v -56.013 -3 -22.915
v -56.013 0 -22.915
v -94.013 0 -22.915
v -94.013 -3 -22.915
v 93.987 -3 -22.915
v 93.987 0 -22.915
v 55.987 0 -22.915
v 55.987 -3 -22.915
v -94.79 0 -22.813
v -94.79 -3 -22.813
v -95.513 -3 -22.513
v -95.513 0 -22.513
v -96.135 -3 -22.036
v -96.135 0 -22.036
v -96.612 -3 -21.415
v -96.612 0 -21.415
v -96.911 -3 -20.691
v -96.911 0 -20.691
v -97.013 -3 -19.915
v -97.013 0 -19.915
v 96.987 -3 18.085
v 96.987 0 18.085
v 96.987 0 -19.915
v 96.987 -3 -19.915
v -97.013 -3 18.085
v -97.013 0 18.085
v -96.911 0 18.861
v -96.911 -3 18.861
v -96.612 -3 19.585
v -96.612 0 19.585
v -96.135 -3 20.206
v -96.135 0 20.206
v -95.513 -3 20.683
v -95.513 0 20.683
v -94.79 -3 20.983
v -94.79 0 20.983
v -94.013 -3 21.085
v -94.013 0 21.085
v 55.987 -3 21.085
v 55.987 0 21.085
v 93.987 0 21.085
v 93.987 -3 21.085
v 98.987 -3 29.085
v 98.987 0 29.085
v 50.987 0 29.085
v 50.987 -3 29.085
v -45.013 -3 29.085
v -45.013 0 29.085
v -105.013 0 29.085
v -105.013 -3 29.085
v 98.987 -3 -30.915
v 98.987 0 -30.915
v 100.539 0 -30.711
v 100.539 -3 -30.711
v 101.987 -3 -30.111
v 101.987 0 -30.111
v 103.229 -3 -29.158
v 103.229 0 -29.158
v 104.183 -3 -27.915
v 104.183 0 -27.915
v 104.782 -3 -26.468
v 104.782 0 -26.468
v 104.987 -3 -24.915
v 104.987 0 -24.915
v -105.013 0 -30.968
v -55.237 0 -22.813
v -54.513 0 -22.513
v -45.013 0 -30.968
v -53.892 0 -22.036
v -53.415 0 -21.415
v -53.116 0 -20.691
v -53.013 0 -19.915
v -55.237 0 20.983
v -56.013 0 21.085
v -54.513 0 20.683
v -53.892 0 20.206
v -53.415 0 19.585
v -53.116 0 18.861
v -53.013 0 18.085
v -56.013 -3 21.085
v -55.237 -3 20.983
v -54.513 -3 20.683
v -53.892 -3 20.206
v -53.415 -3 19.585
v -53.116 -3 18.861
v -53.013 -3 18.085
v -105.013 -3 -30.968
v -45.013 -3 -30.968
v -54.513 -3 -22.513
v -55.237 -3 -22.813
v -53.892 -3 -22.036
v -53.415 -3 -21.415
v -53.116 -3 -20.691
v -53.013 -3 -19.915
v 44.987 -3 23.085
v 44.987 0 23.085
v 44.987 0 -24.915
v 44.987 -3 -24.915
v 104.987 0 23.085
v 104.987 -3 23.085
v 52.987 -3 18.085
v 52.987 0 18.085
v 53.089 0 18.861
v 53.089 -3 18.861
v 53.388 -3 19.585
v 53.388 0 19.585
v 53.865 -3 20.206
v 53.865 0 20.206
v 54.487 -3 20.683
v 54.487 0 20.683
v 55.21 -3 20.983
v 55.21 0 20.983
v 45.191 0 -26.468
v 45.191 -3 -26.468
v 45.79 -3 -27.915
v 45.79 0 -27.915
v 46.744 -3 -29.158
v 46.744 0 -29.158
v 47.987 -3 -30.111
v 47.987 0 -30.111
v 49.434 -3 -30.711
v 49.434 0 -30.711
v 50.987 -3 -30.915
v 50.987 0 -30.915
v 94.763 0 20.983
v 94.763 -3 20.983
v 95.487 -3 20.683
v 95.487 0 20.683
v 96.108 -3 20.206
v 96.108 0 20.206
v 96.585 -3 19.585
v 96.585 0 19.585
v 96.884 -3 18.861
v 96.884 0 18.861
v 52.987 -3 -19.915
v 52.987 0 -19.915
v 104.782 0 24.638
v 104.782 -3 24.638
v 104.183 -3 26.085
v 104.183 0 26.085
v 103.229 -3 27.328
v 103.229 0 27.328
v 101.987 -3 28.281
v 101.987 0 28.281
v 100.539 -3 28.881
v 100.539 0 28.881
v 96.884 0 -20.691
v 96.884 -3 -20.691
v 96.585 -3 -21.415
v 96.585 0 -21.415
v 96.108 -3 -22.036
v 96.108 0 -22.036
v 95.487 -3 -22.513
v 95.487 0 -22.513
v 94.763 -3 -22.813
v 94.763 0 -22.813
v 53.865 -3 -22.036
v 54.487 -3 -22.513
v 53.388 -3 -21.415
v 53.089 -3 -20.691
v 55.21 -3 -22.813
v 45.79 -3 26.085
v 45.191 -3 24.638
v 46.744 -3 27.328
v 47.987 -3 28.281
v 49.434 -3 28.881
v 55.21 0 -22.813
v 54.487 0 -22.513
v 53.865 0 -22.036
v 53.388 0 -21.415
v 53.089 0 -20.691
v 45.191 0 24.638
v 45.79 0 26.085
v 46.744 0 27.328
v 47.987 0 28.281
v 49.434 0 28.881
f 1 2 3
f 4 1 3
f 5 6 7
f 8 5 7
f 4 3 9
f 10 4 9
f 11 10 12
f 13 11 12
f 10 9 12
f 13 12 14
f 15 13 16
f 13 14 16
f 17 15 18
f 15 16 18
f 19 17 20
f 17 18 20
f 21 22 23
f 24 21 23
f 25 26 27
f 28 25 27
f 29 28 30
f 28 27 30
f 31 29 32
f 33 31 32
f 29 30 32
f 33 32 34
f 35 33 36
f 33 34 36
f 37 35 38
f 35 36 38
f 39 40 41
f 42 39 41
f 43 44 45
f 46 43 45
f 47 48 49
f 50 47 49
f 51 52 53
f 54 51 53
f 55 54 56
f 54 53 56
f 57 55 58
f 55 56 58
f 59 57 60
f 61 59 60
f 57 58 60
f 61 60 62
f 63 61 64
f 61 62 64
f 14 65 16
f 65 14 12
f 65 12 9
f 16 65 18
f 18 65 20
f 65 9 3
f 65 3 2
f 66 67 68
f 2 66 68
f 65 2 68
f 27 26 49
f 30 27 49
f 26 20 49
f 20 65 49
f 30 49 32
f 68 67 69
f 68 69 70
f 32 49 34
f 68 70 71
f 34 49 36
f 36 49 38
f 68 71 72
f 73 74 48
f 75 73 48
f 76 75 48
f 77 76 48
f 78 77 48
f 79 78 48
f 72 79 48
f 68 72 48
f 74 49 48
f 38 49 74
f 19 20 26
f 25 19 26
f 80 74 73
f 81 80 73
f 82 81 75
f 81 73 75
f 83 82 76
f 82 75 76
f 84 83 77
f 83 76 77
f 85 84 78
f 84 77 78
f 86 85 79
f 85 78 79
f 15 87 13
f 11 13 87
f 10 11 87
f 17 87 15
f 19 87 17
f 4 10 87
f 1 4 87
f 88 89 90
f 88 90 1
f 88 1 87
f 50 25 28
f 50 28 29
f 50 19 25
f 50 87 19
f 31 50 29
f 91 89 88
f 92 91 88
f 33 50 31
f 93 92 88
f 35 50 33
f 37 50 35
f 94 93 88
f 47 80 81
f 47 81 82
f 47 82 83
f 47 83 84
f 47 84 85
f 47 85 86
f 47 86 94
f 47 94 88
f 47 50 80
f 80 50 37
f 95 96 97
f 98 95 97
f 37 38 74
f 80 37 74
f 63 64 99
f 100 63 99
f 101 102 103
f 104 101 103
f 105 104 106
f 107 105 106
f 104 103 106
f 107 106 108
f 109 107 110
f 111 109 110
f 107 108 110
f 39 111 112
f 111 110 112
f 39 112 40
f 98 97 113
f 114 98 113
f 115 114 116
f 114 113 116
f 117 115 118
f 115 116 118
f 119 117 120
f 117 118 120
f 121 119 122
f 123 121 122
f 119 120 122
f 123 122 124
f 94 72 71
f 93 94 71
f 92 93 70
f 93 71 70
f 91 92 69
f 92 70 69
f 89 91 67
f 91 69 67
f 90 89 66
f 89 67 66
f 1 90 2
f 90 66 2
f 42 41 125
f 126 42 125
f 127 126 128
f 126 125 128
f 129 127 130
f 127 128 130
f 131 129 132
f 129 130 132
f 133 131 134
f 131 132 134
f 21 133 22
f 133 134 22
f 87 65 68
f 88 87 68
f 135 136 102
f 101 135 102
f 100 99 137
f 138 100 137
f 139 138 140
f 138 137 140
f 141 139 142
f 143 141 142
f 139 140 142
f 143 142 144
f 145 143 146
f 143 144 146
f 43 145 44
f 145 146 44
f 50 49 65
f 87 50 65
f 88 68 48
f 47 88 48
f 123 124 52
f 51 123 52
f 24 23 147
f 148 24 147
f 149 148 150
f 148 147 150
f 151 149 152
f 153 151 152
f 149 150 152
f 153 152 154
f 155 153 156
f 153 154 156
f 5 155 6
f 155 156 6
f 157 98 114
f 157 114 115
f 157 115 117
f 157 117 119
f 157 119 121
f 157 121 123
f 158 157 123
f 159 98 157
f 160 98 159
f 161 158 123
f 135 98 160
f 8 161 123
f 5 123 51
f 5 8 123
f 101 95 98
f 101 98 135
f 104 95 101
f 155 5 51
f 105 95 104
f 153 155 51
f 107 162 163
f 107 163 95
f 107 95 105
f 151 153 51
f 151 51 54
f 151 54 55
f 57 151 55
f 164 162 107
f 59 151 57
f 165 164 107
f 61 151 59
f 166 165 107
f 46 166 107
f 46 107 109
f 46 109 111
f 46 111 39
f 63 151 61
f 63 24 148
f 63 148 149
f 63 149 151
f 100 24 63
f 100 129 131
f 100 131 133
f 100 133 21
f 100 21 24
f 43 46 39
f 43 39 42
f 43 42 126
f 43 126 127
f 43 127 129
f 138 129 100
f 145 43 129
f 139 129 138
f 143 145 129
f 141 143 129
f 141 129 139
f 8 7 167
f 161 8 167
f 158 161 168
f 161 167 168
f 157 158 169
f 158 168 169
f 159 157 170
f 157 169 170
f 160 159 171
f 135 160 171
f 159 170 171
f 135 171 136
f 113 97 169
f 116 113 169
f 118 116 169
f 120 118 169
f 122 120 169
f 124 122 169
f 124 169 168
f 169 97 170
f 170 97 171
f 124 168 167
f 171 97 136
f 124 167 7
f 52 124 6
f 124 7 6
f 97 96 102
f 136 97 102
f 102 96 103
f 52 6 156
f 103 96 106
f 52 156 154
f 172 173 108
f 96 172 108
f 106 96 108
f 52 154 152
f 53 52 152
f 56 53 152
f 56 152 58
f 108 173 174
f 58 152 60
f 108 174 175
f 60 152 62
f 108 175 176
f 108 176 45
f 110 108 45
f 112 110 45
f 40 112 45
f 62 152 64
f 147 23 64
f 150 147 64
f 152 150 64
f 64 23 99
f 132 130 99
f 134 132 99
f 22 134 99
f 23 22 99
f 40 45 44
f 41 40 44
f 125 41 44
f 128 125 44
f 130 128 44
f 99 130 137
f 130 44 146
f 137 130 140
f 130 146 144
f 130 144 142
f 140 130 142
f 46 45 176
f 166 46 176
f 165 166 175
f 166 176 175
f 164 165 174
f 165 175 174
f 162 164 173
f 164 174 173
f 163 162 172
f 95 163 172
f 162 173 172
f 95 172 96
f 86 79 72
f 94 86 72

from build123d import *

# Parameters (mm, degrees)
F1_DEPTH = 3


with BuildPart() as f1:
    # F0 (on Front) → F1 (new body)
    with BuildSketch(Plane.XZ):
        with BuildLine():
            Line((98.986508, 29.084981), (50.986508, 29.084981))
            ThreePointArc((50.986508, 29.084981), (46.743867, 27.327622), (44.986508, 23.084981))
            Line((44.986508, 23.084981), (44.986508, -24.915019))
            ThreePointArc((44.986508, -24.915019), (46.743867, -29.157659), (50.986508, -30.915019))
            Line((50.986508, -30.915019), (98.986508, -30.915019))
            ThreePointArc((98.986508, -30.915019), (103.229148, -29.157659), (104.986508, -24.915019))
            Line((104.986508, -24.915019), (104.986508, 23.084981))
            ThreePointArc((104.986508, 23.084981), (103.229148, 27.327622), (98.986508, 29.084981))
        make_face()
        with BuildLine():
            ThreePointArc((52.986508, 18.084981), (53.865187, 20.206302), (55.986508, 21.084981))
            Line((55.986508, 21.084981), (93.986508, 21.084981))
            ThreePointArc((93.986508, 21.084981), (96.107828, 20.206302), (96.986508, 18.084981))
            Line((96.986508, 18.084981), (96.986508, -19.915019))
            ThreePointArc((96.986508, -19.915019), (96.107828, -22.036339), (93.986508, -22.915019))
            Line((93.986508, -22.915019), (55.986508, -22.915019))
            ThreePointArc((55.986508, -22.915019), (53.865187, -22.036339), (52.986508, -19.915019))
            Line((52.986508, -19.915019), (52.986508, 18.084981))
        make_face(mode=Mode.SUBTRACT)
        with BuildLine():
            ThreePointArc((-99.013492, 29.084981), (-103.256133, 27.327622), (-105.013492, 23.084981))
            Line((-105.013492, 23.084981), (-105.013492, -24.915019))
            ThreePointArc((-105.013492, -24.915019), (-103.256133, -29.157659), (-99.013492, -30.915019))
            Line((-99.013492, -30.915019), (-51.013492, -30.915019))
            ThreePointArc((-51.013492, -30.915019), (-46.770852, -29.157659), (-45.013492, -24.915019))
            Line((-45.013492, -24.915019), (-45.013492, 23.084981))
            ThreePointArc((-45.013492, 23.084981), (-46.770852, 27.327622), (-51.013492, 29.084981))
            Line((-51.013492, 29.084981), (-99.013492, 29.084981))
        make_face()
        with BuildLine():
            Line((-94.013492, 21.084981), (-56.013492, 21.084981))
            ThreePointArc((-56.013492, 21.084981), (-53.892172, 20.206302), (-53.013492, 18.084981))
            Line((-53.013492, 18.084981), (-53.013492, -19.915019))
            ThreePointArc((-53.013492, -19.915019), (-53.892172, -22.036339), (-56.013492, -22.915019))
            Line((-56.013492, -22.915019), (-94.013492, -22.915019))
            ThreePointArc((-94.013492, -22.915019), (-96.134813, -22.036339), (-97.013492, -19.915019))
            Line((-97.013492, -19.915019), (-97.013492, 18.084981))
            ThreePointArc((-97.013492, 18.084981), (-96.134813, 20.206302), (-94.013492, 21.084981))
        make_face(mode=Mode.SUBTRACT)
        with BuildLine():
            Line((-105.013492, 29.084981), (-105.013492, 23.084981))
            ThreePointArc((-105.013492, 23.084981), (-103.256133, 27.327622), (-99.013492, 29.084981))
            Line((-99.013492, 29.084981), (-105.013492, 29.084981))
        make_face()
        with BuildLine():
            ThreePointArc((-99.013492, -30.915019), (-103.256133, -29.157659), (-105.013492, -24.915019))
            Line((-105.013492, -24.915019), (-105.013492, -30.9678))
            Line((-105.013492, -30.9678), (-45.013492, -30.9678))
            Line((-45.013492, -30.9678), (-45.013492, -24.915019))
            ThreePointArc((-45.013492, -24.915019), (-46.770852, -29.157659), (-51.013492, -30.915019))
            Line((-51.013492, -30.915019), (-99.013492, -30.915019))
        make_face()
        with BuildLine():
            Line((-45.013492, 29.084981), (-51.013492, 29.084981))
            ThreePointArc((-51.013492, 29.084981), (-46.770852, 27.327622), (-45.013492, 23.084981))
            Line((-45.013492, 23.084981), (-45.013492, 29.084981))
        make_face()
    extrude(amount=F1_DEPTH)


solid = f1.part
